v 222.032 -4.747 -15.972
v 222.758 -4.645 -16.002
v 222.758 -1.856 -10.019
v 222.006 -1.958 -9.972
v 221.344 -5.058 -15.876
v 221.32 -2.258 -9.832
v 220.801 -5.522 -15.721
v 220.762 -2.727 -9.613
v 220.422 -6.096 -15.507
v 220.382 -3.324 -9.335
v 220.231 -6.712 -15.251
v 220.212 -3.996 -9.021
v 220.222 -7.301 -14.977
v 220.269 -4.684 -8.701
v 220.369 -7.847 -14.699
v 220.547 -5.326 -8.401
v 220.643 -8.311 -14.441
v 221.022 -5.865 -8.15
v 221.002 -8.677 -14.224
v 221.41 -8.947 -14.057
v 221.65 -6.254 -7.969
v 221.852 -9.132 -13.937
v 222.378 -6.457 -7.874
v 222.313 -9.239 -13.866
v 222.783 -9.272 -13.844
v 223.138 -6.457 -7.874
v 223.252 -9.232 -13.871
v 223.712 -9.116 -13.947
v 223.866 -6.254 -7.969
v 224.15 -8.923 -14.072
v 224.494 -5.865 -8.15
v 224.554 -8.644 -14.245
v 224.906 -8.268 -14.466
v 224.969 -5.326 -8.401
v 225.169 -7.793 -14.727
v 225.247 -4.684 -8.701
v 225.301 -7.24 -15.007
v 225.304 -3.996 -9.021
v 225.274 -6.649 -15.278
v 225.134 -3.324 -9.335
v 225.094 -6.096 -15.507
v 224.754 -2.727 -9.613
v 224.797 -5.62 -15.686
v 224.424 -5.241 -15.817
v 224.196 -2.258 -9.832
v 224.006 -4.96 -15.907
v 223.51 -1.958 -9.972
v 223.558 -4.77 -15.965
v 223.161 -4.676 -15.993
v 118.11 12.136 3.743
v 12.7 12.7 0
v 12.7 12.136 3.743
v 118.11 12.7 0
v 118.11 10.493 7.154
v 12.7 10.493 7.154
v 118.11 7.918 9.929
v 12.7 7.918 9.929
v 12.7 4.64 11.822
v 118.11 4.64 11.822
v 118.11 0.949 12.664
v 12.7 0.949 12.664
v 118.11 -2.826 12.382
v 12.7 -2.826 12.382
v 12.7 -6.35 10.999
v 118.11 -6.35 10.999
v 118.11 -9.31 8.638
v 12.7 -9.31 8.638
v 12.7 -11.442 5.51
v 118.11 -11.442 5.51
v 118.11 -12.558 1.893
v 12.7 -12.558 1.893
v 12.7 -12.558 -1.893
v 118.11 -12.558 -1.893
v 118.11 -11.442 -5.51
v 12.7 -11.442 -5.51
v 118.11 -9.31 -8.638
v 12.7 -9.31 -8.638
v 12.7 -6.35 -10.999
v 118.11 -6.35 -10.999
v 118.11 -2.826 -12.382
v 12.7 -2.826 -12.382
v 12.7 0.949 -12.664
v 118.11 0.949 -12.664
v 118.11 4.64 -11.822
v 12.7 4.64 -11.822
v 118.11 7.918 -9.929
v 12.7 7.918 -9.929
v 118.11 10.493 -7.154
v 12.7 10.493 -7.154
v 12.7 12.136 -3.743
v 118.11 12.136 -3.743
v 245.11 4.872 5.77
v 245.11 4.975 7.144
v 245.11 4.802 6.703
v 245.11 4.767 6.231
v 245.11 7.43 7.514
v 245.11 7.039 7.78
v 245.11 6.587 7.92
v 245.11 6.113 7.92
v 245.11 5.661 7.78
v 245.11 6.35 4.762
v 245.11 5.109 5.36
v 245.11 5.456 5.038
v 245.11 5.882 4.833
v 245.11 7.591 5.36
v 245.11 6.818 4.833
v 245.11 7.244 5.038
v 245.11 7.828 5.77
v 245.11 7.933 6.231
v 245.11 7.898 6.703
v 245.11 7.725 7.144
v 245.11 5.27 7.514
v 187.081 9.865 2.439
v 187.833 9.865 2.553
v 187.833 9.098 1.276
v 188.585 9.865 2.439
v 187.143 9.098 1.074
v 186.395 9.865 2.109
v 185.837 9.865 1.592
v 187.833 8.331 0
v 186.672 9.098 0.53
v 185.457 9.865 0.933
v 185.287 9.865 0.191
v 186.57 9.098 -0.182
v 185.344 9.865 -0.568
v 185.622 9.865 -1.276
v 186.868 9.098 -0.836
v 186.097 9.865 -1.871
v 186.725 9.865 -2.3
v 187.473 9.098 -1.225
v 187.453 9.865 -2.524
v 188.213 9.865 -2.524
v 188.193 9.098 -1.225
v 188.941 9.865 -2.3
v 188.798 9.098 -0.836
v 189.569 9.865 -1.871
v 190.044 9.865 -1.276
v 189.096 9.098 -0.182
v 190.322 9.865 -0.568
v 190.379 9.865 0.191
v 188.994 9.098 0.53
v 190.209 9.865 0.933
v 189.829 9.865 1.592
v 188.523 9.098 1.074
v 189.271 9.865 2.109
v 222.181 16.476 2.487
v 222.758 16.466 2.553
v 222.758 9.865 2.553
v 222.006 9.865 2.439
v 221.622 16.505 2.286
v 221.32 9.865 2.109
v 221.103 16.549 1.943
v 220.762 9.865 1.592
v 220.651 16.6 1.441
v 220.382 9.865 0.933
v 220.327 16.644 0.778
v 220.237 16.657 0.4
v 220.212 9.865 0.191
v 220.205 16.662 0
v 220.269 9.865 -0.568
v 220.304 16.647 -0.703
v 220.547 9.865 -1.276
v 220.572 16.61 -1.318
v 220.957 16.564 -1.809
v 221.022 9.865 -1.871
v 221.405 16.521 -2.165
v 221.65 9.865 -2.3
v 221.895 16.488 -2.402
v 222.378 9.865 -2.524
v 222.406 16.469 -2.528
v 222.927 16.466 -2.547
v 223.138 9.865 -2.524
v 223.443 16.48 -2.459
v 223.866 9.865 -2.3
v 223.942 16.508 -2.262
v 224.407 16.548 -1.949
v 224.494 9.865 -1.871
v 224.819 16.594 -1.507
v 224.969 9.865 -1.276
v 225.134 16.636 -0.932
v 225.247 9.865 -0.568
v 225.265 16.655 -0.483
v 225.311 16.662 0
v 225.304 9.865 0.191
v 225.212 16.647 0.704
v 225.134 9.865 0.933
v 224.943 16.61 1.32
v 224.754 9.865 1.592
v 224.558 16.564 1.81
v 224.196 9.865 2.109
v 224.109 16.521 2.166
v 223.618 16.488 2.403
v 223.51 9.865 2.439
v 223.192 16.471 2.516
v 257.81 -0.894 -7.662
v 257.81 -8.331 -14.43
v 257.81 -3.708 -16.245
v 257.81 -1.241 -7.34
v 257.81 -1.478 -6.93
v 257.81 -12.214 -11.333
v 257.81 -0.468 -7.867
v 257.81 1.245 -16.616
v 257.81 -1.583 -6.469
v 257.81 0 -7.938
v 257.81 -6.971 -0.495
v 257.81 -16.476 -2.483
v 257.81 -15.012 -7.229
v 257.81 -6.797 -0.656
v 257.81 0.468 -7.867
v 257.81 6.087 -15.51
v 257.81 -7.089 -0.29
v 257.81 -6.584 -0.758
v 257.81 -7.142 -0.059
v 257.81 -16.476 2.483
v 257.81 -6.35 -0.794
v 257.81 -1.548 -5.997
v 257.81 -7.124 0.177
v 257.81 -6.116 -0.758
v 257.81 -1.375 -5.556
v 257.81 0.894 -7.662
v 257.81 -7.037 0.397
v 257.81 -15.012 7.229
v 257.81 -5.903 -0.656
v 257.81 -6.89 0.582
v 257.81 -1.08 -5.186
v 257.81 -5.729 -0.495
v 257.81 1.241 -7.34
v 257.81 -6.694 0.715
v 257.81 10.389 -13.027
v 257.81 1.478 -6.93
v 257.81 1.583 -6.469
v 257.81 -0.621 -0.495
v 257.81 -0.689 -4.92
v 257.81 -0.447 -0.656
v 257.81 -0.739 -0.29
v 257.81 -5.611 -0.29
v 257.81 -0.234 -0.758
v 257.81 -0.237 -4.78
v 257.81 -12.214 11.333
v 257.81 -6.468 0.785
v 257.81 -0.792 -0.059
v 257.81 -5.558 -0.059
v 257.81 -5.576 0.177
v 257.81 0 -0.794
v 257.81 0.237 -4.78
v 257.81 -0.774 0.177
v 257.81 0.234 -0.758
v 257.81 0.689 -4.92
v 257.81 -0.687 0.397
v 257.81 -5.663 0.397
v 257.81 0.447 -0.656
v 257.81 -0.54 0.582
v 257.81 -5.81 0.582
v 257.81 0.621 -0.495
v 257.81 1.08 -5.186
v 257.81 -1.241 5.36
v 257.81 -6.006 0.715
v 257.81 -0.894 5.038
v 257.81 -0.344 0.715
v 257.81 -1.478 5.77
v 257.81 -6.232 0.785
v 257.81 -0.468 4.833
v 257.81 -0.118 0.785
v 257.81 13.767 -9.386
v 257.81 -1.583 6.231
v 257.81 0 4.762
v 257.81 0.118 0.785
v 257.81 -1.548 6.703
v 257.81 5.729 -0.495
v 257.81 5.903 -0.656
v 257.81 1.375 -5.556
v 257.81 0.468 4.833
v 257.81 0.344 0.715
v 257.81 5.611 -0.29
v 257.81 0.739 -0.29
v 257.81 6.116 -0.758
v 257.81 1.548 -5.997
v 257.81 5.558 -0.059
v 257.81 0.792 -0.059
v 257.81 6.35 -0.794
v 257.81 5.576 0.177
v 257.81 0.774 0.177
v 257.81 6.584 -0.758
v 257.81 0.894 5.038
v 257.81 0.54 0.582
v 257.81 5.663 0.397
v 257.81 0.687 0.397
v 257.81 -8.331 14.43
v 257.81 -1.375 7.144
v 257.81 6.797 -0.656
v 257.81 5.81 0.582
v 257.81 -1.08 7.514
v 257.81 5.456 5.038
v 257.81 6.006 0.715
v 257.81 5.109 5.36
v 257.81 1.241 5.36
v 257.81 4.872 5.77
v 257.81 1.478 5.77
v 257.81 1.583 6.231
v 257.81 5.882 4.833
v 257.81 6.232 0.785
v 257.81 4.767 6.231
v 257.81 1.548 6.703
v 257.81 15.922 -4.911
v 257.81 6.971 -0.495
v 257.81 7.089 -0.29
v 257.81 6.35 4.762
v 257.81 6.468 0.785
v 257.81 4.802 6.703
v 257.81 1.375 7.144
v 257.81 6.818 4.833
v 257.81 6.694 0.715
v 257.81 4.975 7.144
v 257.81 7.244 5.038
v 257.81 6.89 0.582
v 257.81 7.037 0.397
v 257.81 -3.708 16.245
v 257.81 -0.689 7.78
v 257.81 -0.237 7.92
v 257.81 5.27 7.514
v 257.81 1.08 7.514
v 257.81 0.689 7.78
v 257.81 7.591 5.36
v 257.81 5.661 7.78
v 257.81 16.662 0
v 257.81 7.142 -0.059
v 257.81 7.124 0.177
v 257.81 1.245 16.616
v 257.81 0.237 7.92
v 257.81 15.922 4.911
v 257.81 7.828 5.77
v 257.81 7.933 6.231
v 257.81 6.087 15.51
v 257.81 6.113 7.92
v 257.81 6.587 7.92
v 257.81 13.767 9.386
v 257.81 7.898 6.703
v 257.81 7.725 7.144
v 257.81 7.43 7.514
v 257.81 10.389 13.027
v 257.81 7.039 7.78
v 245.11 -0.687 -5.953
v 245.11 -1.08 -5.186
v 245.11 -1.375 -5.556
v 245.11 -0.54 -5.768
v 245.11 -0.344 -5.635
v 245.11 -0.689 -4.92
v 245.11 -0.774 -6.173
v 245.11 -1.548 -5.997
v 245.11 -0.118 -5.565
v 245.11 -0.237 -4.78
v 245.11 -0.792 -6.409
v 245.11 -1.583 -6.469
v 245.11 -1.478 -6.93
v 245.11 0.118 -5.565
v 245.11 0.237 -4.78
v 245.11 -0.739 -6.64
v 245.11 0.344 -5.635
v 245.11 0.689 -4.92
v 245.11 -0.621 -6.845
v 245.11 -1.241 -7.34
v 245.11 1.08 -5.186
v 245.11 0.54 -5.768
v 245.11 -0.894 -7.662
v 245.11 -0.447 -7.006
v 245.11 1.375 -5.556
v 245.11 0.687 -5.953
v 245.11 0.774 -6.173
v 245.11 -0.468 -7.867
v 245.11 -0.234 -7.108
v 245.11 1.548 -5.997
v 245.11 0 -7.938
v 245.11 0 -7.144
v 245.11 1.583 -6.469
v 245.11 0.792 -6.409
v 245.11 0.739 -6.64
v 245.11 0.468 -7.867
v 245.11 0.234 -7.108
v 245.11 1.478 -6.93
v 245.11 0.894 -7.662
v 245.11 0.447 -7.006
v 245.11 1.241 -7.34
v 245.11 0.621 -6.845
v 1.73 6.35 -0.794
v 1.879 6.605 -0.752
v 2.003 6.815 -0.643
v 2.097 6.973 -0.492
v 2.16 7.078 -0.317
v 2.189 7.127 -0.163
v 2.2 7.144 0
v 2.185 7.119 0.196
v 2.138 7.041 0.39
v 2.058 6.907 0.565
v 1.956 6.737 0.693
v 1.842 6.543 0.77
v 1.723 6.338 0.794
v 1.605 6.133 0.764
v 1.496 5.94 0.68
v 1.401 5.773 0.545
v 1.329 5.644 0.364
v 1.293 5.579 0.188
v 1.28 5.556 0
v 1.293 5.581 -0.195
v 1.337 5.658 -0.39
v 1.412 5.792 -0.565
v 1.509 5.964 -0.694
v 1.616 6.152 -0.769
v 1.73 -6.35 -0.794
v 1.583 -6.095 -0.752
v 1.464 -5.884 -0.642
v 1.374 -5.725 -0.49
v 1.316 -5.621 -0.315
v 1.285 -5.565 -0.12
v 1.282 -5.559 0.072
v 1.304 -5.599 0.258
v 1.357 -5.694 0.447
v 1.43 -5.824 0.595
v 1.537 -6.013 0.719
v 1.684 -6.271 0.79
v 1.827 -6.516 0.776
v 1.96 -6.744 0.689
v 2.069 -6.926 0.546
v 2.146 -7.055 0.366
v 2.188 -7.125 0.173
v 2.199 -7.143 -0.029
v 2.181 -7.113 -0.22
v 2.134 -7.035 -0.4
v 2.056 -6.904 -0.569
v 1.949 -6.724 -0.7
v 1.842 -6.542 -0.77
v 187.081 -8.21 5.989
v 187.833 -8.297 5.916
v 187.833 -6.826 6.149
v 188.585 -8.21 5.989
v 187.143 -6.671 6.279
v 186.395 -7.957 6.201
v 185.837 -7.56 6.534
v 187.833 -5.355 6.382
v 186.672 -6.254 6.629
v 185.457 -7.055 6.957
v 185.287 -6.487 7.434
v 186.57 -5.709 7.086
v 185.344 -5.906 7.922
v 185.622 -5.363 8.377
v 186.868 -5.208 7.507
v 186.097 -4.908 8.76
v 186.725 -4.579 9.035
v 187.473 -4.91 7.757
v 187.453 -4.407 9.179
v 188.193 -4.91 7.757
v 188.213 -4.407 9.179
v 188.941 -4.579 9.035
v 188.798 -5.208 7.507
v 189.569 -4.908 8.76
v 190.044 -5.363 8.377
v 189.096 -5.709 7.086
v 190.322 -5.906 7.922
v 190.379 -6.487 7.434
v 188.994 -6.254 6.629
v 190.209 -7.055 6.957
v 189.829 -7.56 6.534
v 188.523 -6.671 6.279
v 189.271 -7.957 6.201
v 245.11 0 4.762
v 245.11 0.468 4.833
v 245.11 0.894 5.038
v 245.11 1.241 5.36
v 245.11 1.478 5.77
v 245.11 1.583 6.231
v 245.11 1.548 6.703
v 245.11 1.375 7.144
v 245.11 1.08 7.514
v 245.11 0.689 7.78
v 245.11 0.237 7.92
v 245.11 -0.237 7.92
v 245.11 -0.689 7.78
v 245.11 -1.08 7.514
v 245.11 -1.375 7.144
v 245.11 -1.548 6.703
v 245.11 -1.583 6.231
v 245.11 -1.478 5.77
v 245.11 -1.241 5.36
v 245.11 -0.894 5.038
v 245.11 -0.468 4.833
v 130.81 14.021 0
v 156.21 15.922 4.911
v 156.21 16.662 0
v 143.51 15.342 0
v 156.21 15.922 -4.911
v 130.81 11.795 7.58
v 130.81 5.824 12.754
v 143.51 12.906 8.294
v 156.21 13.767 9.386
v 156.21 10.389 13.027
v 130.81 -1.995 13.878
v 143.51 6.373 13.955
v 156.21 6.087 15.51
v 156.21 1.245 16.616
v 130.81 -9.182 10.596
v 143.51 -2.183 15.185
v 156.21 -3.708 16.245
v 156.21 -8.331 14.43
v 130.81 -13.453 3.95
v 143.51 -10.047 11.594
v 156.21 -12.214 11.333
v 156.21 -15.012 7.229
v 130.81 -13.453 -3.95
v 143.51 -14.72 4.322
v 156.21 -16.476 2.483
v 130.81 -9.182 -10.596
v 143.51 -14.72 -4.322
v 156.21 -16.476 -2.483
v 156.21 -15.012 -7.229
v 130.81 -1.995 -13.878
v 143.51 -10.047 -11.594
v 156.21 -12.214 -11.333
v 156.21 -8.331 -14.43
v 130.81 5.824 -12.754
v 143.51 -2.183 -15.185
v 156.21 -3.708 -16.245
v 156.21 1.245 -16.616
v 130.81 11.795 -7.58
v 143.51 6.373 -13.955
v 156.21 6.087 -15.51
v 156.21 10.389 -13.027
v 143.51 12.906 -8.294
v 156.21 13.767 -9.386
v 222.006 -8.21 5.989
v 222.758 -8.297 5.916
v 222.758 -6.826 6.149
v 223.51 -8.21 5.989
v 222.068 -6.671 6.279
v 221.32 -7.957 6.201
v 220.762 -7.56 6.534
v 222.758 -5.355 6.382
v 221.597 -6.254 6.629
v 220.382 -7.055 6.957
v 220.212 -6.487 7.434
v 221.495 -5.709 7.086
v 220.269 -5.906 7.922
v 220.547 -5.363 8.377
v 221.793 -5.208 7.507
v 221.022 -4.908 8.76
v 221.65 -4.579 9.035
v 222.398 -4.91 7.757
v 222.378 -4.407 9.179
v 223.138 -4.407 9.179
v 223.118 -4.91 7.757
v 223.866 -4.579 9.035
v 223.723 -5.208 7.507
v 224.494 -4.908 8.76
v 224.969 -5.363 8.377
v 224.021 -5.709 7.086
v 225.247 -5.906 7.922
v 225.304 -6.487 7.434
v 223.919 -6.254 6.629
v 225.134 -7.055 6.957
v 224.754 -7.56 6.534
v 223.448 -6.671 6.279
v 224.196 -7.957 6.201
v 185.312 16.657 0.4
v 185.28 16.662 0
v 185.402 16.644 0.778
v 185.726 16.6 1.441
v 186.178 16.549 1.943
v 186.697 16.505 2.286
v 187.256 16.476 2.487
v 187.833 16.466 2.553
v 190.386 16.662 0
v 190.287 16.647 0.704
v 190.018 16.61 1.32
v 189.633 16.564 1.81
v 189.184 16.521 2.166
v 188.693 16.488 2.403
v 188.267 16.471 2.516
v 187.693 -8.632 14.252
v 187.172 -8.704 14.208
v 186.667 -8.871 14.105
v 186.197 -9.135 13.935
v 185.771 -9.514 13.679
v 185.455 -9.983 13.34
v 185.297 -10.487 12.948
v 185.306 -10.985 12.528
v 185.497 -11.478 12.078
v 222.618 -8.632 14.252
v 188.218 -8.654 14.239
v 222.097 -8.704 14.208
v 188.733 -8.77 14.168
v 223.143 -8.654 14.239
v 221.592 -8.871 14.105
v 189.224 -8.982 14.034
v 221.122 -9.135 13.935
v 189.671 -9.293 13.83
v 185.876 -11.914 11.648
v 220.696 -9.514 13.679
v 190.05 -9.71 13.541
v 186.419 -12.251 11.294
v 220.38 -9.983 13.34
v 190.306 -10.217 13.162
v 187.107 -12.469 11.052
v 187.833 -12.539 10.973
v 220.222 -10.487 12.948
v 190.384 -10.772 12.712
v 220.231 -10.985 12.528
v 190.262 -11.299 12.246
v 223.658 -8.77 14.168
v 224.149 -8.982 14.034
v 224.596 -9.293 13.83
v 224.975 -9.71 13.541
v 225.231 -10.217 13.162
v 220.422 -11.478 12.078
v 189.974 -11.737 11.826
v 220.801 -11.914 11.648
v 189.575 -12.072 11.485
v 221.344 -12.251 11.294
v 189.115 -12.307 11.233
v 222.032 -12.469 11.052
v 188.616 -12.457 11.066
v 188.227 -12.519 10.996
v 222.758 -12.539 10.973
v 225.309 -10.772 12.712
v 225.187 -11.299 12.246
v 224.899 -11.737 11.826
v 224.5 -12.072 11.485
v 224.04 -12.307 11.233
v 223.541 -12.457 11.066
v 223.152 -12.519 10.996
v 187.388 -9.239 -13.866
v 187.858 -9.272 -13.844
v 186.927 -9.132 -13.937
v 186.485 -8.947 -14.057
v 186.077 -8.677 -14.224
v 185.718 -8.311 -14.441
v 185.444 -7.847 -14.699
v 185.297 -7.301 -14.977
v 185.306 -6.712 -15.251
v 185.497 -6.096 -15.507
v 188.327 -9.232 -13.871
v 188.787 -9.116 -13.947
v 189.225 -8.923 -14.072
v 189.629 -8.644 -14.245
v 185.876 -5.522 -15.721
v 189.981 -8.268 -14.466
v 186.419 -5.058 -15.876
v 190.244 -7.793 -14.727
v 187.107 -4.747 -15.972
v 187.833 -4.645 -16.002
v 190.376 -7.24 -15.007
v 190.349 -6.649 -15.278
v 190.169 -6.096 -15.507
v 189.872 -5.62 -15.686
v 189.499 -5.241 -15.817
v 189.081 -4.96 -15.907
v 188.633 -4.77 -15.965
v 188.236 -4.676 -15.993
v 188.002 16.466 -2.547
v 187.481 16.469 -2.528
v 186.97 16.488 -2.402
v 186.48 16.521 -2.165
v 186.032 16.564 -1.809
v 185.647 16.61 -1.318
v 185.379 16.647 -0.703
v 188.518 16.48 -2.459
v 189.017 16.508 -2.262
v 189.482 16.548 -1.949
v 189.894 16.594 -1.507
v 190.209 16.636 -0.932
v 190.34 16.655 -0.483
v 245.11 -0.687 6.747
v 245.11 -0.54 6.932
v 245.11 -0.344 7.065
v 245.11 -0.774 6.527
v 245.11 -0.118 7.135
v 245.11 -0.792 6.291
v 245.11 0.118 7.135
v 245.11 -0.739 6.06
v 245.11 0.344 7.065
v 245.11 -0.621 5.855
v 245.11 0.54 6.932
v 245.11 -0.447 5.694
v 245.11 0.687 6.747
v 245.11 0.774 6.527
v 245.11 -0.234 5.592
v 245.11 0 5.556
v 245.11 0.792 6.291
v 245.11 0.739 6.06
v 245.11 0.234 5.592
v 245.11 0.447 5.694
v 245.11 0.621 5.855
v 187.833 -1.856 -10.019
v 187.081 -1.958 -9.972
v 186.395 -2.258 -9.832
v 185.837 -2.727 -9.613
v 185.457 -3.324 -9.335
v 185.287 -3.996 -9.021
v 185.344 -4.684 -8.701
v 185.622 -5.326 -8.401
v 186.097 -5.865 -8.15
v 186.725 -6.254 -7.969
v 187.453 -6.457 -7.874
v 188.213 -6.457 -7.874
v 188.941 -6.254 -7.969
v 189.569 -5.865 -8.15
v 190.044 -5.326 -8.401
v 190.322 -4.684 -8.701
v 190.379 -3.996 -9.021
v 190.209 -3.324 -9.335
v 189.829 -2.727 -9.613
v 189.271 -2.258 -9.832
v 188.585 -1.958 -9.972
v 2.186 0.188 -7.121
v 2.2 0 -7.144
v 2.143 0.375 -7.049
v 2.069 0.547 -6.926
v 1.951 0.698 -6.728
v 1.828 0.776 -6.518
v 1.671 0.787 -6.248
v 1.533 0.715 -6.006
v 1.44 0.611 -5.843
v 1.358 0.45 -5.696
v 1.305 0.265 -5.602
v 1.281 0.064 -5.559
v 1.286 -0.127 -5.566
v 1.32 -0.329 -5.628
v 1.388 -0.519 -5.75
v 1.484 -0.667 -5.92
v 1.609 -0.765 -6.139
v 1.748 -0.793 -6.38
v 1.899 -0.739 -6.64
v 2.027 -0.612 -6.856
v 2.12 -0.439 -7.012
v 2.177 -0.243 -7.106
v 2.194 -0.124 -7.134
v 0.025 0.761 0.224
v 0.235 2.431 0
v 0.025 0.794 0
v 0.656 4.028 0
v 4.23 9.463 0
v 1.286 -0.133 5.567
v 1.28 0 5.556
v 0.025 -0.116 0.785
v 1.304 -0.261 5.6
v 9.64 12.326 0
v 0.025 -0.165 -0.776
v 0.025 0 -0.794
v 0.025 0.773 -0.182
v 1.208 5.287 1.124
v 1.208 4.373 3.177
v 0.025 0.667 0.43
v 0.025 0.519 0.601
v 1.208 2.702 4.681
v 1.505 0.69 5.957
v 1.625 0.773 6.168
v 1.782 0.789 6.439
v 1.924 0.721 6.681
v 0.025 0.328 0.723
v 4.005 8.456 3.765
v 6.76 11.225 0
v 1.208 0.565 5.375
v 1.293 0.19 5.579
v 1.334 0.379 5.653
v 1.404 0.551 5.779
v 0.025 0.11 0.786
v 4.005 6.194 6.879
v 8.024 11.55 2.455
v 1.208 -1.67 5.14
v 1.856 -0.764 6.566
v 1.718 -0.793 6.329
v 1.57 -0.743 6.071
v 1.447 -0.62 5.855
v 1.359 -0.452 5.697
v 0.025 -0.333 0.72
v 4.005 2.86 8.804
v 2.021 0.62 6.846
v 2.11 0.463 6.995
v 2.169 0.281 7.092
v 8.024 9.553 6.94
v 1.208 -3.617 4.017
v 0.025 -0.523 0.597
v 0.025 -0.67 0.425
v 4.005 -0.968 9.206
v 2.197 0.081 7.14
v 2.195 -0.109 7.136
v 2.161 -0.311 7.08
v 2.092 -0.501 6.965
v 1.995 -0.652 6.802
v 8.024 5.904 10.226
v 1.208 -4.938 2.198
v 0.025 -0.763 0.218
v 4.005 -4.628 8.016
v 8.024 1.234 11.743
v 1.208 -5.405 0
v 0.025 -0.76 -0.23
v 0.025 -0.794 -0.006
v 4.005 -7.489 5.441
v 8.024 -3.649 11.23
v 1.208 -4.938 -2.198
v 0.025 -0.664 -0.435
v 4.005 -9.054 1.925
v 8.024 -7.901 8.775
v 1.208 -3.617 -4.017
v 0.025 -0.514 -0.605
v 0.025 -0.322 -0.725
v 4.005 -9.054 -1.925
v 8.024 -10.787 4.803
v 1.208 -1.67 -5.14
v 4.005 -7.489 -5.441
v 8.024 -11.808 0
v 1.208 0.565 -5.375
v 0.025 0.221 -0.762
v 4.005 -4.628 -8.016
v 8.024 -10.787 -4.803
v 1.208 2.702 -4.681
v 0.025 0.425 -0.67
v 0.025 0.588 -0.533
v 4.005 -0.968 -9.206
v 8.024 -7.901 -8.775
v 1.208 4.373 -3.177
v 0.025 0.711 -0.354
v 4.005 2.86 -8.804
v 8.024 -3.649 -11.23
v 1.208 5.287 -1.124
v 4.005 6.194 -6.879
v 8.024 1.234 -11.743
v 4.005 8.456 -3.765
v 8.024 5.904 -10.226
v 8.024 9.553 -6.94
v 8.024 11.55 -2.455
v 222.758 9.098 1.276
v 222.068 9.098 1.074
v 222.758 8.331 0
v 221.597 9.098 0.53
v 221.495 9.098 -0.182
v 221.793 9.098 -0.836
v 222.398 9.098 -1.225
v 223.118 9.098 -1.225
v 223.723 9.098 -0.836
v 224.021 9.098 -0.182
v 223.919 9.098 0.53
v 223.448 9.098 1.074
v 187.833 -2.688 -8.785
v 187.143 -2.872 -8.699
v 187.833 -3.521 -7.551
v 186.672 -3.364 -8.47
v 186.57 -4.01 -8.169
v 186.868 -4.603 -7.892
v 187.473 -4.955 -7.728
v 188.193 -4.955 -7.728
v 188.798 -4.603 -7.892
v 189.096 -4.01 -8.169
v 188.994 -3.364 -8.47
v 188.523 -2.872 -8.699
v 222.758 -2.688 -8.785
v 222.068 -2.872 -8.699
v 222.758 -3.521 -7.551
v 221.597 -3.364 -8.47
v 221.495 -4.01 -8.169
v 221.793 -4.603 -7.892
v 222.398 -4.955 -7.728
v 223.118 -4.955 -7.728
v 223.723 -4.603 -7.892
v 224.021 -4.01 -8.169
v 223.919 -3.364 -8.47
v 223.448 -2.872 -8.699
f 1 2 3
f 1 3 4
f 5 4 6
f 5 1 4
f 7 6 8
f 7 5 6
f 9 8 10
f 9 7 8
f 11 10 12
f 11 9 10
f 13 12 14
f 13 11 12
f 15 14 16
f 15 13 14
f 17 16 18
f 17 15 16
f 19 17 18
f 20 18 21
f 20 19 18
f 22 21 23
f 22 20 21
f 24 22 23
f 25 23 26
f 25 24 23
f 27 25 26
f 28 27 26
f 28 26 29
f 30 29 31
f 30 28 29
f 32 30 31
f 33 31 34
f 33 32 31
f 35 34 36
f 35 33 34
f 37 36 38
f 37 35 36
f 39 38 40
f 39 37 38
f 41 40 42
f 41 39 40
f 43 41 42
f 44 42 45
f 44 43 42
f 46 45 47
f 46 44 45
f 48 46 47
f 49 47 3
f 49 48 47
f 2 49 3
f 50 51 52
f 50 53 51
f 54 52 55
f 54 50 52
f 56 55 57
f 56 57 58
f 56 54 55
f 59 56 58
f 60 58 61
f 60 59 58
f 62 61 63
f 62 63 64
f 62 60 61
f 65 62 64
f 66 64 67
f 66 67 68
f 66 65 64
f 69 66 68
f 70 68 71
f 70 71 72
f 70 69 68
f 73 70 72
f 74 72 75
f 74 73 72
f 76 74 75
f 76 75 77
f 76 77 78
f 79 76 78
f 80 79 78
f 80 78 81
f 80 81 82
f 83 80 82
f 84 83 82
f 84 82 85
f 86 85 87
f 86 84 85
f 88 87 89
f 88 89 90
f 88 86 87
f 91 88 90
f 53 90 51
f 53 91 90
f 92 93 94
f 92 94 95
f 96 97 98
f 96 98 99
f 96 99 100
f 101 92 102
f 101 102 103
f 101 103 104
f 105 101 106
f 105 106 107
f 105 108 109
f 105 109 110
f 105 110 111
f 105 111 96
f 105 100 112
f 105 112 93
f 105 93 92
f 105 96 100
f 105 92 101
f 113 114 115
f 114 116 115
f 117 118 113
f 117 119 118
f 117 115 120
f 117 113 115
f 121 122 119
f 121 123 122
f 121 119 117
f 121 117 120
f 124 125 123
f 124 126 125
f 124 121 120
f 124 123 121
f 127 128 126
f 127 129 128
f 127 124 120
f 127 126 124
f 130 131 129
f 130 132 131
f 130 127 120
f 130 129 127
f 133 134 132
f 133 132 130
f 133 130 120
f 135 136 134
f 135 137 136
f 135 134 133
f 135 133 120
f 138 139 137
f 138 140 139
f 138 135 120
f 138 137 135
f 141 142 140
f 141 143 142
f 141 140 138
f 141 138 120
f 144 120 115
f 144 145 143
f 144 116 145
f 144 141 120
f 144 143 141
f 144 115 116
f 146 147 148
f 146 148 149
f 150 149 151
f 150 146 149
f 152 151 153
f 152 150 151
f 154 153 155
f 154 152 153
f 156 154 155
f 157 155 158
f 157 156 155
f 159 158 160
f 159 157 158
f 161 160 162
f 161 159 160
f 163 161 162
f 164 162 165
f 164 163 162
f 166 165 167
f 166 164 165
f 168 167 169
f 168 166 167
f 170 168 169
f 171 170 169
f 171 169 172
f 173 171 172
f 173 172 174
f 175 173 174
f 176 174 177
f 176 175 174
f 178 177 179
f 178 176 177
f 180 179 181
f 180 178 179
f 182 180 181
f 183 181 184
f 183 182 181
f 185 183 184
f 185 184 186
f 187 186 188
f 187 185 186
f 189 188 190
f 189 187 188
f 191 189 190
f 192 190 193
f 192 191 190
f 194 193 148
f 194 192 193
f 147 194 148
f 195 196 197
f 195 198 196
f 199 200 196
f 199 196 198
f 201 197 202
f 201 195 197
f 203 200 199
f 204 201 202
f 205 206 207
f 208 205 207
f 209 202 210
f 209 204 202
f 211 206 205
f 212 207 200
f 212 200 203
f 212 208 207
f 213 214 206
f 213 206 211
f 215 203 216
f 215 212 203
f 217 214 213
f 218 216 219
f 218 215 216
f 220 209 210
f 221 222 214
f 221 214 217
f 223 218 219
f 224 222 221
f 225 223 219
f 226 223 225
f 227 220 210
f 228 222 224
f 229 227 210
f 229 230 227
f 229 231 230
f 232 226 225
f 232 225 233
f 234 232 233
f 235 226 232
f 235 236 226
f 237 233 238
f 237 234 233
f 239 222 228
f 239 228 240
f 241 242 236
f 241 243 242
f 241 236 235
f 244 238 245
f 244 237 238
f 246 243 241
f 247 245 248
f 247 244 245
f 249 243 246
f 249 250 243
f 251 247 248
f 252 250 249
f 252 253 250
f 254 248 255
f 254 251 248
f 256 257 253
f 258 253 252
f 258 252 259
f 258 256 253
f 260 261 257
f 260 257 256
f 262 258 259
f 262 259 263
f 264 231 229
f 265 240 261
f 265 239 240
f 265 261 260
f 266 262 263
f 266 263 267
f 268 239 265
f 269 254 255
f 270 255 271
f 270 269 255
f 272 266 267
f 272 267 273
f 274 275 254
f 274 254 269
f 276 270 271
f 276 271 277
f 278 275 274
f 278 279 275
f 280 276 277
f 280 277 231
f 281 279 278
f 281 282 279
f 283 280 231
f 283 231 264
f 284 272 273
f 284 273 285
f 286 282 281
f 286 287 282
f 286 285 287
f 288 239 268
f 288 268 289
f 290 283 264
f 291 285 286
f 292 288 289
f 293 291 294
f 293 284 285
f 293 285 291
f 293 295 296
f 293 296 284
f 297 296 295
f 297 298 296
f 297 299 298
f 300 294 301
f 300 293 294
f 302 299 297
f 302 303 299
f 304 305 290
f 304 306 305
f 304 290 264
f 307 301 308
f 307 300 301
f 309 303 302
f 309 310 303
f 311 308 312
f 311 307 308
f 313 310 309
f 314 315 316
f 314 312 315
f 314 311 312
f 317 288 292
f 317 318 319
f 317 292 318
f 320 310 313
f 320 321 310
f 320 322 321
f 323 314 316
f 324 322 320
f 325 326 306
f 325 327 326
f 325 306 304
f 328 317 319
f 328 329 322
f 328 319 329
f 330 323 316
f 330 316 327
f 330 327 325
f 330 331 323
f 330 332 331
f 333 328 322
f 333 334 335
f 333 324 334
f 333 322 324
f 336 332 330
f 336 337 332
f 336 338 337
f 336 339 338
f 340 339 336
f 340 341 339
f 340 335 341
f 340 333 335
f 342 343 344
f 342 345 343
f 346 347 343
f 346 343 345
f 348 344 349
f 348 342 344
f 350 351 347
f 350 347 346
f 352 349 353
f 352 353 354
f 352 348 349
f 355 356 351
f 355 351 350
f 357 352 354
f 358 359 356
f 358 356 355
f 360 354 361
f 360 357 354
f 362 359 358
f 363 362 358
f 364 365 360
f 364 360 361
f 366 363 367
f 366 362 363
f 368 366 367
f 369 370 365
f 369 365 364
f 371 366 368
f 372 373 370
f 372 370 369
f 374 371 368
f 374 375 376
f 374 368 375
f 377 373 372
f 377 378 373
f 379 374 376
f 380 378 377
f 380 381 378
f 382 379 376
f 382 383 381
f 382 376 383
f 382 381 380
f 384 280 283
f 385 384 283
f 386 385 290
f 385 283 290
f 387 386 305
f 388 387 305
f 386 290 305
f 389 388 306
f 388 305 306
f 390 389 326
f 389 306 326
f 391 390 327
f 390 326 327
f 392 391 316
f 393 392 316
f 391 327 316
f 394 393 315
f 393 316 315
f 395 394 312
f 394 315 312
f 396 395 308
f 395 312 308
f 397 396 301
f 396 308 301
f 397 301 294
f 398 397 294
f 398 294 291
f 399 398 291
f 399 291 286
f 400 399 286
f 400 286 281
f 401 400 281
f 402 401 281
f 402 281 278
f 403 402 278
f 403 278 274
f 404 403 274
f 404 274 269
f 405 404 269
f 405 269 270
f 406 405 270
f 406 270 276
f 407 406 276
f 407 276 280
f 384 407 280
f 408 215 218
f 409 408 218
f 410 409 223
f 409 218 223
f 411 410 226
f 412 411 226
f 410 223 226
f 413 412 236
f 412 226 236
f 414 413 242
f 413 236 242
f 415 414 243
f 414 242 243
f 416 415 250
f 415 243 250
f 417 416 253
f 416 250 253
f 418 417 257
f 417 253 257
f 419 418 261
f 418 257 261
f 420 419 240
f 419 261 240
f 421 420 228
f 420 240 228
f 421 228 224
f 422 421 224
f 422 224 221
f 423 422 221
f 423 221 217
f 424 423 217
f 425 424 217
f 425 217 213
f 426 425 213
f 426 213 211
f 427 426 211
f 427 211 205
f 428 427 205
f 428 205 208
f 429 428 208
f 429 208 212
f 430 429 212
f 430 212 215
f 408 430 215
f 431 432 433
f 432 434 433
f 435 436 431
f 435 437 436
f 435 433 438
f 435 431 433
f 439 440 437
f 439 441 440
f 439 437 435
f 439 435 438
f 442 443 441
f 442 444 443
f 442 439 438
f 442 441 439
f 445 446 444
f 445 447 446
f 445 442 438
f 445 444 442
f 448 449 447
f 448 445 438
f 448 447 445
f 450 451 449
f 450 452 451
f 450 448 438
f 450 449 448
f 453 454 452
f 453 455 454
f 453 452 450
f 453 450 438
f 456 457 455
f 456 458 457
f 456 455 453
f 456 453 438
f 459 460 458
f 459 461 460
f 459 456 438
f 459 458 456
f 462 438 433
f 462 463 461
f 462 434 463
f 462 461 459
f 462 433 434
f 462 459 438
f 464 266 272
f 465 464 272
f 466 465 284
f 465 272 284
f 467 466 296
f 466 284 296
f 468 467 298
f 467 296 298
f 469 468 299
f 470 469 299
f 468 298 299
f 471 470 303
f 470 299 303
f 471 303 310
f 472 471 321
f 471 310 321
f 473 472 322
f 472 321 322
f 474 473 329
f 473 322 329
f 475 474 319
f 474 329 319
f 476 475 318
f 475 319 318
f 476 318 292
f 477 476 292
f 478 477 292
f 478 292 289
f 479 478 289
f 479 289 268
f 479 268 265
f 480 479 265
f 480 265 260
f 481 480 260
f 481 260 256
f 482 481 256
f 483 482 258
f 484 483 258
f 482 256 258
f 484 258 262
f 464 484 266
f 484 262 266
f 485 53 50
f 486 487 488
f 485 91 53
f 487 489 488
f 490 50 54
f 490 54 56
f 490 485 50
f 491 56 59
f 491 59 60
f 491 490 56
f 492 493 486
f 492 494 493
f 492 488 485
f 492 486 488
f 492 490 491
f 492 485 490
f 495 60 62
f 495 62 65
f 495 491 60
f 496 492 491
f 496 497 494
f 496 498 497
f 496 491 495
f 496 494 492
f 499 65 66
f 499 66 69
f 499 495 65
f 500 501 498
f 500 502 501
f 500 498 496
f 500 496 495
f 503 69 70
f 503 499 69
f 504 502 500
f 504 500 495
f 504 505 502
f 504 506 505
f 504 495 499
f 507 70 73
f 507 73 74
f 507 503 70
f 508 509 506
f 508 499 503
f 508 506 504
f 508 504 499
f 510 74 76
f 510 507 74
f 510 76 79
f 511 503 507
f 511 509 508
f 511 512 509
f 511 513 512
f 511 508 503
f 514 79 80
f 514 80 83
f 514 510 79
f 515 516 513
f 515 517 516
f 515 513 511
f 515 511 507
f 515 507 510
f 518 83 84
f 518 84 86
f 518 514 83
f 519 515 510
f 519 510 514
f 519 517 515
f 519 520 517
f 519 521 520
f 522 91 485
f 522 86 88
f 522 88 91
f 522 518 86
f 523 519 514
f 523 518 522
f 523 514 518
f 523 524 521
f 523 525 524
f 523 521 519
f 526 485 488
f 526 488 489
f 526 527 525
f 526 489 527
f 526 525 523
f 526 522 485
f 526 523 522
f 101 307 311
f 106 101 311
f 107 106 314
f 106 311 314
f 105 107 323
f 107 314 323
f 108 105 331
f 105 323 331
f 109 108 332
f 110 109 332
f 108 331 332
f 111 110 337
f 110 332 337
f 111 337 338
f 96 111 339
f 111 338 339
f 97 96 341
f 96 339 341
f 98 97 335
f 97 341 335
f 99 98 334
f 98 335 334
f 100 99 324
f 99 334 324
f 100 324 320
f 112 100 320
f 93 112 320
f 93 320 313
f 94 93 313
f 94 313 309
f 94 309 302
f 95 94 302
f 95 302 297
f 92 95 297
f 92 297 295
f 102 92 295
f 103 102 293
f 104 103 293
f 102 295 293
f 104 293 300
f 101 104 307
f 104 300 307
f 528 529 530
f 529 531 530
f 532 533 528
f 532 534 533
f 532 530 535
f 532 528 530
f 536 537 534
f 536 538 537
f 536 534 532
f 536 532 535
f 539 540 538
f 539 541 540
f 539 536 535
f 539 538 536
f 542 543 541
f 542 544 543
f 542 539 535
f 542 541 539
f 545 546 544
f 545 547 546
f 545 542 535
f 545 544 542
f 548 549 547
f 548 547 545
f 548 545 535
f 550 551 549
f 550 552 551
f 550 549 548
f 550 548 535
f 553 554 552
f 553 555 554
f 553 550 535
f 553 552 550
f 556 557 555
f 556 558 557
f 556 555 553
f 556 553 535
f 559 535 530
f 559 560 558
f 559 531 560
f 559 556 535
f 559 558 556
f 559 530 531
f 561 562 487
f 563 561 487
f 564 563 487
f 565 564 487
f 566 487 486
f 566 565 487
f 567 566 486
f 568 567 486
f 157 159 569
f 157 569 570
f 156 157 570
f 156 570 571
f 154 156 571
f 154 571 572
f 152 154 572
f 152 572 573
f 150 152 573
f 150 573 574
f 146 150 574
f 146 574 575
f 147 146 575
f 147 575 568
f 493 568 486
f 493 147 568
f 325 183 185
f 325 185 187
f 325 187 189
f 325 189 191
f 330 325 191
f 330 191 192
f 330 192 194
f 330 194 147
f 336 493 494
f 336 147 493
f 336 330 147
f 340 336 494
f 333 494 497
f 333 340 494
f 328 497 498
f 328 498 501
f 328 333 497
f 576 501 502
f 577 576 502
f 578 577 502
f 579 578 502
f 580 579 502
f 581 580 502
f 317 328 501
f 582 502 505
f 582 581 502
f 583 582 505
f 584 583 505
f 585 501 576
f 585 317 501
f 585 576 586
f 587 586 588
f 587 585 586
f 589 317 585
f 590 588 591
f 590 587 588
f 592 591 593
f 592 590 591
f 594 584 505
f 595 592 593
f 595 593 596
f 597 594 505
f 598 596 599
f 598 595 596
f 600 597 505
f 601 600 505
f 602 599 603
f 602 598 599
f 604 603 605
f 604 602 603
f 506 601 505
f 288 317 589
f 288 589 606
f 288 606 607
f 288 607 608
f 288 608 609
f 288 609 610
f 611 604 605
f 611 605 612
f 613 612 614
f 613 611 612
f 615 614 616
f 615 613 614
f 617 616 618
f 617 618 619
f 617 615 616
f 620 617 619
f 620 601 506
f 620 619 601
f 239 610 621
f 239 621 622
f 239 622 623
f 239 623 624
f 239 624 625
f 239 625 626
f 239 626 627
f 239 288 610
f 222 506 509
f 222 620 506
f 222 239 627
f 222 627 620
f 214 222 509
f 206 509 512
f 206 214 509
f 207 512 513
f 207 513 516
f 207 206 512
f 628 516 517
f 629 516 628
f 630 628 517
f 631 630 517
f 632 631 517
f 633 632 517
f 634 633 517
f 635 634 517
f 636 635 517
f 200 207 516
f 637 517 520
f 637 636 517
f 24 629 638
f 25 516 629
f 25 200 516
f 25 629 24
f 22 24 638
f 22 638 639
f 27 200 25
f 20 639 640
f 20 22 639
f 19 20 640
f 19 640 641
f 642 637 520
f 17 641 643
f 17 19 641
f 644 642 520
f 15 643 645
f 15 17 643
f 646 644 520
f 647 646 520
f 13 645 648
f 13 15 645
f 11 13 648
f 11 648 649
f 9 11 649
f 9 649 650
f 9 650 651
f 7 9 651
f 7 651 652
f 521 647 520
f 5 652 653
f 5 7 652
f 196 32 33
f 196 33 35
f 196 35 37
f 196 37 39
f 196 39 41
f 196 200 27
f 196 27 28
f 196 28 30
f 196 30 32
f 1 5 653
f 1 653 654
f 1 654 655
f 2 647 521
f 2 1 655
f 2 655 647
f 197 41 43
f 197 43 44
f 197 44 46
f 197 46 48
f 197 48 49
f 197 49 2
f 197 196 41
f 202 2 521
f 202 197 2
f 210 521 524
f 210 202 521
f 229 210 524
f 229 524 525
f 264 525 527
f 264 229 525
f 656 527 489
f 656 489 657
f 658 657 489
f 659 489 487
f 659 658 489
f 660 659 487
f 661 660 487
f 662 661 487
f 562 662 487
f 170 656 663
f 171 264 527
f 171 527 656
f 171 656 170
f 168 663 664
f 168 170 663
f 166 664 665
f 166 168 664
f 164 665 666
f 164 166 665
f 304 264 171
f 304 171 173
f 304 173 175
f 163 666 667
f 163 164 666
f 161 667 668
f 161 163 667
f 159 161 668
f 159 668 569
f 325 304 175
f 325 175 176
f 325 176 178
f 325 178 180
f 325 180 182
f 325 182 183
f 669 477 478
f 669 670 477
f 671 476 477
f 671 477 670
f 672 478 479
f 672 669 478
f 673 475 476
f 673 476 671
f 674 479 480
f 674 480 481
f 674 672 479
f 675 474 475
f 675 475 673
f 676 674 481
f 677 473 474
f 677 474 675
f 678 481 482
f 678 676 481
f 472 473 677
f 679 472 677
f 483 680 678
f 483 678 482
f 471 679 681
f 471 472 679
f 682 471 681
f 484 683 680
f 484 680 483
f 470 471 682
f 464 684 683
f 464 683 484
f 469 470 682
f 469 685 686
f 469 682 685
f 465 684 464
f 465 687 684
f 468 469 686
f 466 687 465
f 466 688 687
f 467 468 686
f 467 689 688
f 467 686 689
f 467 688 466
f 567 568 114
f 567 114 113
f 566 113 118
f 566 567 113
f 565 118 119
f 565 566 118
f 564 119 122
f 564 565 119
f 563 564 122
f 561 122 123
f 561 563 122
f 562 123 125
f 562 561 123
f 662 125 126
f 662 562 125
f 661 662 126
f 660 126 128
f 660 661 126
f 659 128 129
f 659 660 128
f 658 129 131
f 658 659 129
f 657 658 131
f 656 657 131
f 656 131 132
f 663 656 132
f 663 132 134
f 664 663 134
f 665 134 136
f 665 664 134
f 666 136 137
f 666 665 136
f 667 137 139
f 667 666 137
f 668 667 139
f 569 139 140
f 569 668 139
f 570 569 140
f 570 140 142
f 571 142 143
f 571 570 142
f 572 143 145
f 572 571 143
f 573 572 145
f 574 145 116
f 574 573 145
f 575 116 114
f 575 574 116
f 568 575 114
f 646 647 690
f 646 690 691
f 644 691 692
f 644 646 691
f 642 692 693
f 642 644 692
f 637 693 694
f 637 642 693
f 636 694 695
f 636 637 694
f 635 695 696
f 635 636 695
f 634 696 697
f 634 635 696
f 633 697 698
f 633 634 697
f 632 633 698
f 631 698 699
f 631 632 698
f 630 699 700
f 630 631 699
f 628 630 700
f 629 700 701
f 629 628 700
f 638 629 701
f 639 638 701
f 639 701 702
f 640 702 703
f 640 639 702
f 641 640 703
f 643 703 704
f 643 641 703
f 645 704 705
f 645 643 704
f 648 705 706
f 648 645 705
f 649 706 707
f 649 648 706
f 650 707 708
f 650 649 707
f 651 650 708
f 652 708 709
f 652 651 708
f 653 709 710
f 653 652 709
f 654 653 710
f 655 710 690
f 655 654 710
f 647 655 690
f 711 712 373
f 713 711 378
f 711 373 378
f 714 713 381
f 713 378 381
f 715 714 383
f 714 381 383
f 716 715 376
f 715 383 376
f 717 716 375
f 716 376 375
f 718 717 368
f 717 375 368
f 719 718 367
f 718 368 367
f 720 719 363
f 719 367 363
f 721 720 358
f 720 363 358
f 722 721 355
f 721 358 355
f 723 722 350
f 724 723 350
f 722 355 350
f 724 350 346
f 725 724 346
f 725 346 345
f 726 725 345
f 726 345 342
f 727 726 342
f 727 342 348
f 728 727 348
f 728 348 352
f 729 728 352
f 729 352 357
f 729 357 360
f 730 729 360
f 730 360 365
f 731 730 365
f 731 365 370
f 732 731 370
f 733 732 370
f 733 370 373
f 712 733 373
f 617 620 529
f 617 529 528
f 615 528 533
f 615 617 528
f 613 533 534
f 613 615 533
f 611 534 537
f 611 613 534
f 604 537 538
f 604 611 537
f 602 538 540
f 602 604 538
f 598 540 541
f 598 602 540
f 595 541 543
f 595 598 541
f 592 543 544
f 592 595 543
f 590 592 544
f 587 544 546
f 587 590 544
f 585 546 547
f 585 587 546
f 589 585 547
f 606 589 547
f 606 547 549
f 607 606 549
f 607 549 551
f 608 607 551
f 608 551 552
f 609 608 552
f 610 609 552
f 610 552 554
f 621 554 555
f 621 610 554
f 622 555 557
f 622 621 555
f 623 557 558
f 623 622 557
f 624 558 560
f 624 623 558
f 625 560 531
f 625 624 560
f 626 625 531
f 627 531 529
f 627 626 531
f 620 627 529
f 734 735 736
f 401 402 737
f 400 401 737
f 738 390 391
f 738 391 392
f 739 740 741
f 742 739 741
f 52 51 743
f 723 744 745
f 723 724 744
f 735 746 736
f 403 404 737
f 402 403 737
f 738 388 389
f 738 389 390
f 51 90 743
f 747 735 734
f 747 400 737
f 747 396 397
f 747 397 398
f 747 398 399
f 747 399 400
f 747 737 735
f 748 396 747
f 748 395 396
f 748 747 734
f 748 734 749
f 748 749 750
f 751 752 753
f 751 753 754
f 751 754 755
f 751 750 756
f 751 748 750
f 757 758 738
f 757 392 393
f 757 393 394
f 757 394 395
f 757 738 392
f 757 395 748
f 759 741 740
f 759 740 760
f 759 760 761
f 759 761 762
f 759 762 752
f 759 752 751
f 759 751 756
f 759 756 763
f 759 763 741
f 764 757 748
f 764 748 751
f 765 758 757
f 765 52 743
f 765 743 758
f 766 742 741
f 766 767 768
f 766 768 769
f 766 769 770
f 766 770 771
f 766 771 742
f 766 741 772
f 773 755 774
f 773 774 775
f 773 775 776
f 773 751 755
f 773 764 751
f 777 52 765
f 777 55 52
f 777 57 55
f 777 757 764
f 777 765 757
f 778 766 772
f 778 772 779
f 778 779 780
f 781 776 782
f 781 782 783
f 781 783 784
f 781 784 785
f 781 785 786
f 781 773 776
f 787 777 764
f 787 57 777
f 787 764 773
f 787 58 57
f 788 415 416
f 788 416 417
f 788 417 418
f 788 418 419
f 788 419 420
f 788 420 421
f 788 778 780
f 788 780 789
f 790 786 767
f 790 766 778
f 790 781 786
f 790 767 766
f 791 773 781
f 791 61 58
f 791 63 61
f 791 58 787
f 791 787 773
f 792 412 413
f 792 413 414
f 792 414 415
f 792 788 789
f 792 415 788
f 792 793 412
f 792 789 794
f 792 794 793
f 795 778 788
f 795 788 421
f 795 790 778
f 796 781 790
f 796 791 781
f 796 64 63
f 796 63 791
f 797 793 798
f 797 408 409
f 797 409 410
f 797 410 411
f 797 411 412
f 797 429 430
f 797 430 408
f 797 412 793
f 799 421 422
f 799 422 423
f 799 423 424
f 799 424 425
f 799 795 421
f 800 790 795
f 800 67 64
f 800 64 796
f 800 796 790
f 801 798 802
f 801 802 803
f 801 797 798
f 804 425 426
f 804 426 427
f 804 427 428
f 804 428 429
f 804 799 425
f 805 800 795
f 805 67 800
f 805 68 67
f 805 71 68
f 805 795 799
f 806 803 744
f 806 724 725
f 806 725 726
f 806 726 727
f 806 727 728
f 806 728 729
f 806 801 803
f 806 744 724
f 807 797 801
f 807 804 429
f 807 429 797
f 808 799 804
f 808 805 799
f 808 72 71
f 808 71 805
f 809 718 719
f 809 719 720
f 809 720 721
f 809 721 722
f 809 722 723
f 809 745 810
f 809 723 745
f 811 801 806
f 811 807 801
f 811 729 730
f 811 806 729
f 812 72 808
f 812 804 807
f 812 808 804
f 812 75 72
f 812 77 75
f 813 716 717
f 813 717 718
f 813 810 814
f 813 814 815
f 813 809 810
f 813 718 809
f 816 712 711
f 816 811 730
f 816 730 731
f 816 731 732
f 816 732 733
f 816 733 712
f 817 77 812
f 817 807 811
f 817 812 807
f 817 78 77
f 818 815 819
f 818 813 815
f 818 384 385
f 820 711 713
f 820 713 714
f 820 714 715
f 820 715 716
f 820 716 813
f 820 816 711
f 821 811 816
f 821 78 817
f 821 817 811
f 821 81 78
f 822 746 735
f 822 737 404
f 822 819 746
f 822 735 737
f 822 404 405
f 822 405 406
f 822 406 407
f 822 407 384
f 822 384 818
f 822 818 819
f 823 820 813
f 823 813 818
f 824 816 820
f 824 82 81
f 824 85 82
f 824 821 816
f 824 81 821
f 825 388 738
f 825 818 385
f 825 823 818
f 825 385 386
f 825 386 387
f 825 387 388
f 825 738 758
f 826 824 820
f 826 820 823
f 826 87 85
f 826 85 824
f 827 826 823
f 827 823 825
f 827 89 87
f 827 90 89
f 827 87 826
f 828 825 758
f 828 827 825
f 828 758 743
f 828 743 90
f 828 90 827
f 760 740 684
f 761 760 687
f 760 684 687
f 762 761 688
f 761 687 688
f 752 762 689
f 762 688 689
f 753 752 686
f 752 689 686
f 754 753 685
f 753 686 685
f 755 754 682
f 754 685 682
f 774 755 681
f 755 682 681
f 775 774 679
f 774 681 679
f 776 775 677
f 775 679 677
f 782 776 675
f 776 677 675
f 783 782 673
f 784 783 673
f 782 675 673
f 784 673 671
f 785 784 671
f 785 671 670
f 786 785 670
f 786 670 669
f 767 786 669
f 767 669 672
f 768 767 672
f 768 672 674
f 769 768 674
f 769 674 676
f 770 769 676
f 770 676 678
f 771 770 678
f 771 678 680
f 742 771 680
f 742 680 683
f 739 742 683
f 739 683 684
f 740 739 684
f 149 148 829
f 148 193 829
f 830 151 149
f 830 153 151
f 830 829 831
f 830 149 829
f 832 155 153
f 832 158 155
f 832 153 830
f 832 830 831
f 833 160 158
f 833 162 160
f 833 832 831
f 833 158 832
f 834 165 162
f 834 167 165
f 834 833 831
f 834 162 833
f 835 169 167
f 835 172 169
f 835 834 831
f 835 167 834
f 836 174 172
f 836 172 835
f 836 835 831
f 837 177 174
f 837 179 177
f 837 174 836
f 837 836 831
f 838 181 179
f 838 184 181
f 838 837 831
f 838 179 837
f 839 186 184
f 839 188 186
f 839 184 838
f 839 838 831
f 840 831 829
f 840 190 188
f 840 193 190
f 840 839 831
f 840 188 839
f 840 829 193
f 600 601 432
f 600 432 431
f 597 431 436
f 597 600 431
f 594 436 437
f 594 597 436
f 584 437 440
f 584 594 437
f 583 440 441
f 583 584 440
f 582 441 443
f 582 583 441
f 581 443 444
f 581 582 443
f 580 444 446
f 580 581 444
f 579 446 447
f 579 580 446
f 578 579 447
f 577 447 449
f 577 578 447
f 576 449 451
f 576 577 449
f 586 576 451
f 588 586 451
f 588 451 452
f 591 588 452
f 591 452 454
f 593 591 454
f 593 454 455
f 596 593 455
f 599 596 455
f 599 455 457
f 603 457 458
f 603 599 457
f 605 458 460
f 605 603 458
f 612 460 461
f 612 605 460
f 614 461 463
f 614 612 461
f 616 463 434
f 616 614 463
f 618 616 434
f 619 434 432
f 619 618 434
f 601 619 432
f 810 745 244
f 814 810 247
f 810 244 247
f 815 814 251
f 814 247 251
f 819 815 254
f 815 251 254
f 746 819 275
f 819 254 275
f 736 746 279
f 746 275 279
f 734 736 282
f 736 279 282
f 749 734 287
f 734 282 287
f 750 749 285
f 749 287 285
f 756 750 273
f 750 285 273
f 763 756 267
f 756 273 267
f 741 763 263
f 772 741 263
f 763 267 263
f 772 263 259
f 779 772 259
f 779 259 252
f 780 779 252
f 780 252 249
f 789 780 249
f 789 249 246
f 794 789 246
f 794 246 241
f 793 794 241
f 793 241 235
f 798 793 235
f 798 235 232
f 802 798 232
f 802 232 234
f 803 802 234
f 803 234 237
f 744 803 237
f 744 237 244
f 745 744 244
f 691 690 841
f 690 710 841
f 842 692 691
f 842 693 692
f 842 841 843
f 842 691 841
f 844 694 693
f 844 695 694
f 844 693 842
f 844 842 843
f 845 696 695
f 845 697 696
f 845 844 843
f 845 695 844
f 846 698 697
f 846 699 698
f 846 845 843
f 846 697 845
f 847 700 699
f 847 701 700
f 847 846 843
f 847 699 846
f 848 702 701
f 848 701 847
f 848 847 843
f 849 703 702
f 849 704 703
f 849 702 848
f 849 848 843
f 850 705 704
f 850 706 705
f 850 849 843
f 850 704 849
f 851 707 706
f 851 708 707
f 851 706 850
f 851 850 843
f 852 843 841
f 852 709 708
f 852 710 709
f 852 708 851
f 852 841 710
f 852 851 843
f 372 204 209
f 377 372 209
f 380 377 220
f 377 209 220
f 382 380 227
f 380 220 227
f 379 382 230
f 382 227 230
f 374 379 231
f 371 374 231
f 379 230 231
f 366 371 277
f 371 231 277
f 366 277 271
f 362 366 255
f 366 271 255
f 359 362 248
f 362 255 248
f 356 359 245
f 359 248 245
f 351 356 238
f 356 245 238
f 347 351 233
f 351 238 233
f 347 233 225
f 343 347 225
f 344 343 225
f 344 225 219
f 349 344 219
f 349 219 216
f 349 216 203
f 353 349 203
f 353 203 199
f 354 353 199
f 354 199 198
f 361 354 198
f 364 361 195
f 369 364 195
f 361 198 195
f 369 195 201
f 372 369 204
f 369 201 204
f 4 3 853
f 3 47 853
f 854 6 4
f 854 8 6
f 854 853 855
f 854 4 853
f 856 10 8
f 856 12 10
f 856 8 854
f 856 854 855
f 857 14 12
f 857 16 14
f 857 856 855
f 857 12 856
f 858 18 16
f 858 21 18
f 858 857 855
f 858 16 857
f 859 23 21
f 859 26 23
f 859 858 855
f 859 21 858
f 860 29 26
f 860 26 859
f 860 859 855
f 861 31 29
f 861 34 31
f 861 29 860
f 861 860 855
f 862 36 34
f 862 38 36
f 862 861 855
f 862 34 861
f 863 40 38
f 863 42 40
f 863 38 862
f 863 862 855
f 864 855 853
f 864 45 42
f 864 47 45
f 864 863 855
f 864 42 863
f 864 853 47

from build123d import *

# Parameters (mm, degrees)
SKETCH3_R                             = 0.79375
CUT_EXTRUDE1_DEPTH                    = 258.810003035
SKETCH4_R                             = 1.5875
CUT_EXTRUDE2_DEPTH                    = 12.7
TAP_DRILL_FOR_10_HELICOIL2_AT_2_COUNT = 2
TAP_DRILL_FOR_10_HELICOIL2_AT_2_PITCH = 34.925
CIRPATTERN2_COUNT                     = 3
CIRPATTERN2_ANGLE                     = 230
SKETCH11_R                            = 1.5875
CUT_EXTRUDE3_DEPTH                    = 12.7


with BuildPart() as part:
    # Sketch1 → Revolve1 (revolve)
    with BuildSketch(Plane.XY):
        with BuildLine():
            Line((12.7, 12.7), (118.11, 12.7))
            Line((118.11, 12.7), (156.210003035, 16.662289952))
            Line((156.210003035, 16.662289952), (257.810003035, 16.662289952))
            Line((257.810003035, 16.662289952), (257.810003035, 0))
            Line((257.810003035, 0), (0, 0))
            ThreePointArc((0, 0), (3.719743879, 8.980256121), (12.7, 12.7))
        make_face()
    revolve(axis=Axis((0, 0, 0), (1, 0, 0)))

    # Sketch3 → Cut-Extrude1 (cut, through all)
    with BuildSketch(Plane(origin=(257.810003035, 0, 0), x_dir=(0, 0, -1), z_dir=(1, 0, 0))):
        Circle(SKETCH3_R)
        with Locations((6.35, 0)):
            Circle(SKETCH3_R)
        with Locations((-6.35, 0)):
            Circle(SKETCH3_R)
        with Locations((0, 6.35)):
            Circle(SKETCH3_R)
        with Locations((0, -6.35)):
            Circle(SKETCH3_R)
    extrude(amount=-CUT_EXTRUDE1_DEPTH, mode=Mode.SUBTRACT)

    # Sketch4 → Cut-Extrude2 (cut)
    with BuildSketch(Plane(origin=(257.810003035, 0, 0), x_dir=(0, 0, -1), z_dir=(1, 0, 0))):
        with Locations((-6.35, 0)):
            Circle(SKETCH4_R)
        with Locations((6.35, 0)):
            Circle(SKETCH4_R)
    extrude(amount=-CUT_EXTRUDE2_DEPTH, mode=Mode.SUBTRACT)

    # Sketch8 → Tap Drill for #10 Helicoil2 (revolve, cut)
    with BuildSketch(Plane(origin=(222.758003035, 16.662289952, 0), x_dir=(0, 0, 1), z_dir=(1, 0, 0))):
        Polygon((0, 0), (0, 8.3312), (2.5527, 6.797383098), (2.5527, 0), align=None)
    tap_drill_for_10_helicoil2 = revolve(axis=Axis((222.758003035, 23.012289952, 0), (0, -1, 0)), mode=Mode.SUBTRACT)

    # Tap Drill for #10 Helicoil2 at 2: Tap Drill for #10 Helicoil2 ×2
    with Locations(*[(-i * TAP_DRILL_FOR_10_HELICOIL2_AT_2_PITCH, 0, 0) for i in range(1, TAP_DRILL_FOR_10_HELICOIL2_AT_2_COUNT)]):
        add(tap_drill_for_10_helicoil2, mode=Mode.SUBTRACT)

    # CirPattern2: Tap Drill for #10 Helicoil2 ×3 about axis
    cirpattern2_axis = Axis((257.810003035, 0, 0), (-1, 0, 0))
    for i in range(1, CIRPATTERN2_COUNT):
        add(tap_drill_for_10_helicoil2.rotate(cirpattern2_axis, i * CIRPATTERN2_ANGLE / (CIRPATTERN2_COUNT - 1)), mode=Mode.SUBTRACT)

    # CirPattern2 copy 1 sketch → CirPattern2 copy 1 (revolve, cut)
    with BuildSketch(Plane(origin=(187.833003035, -7.041788016, -15.101163133), x_dir=(0, 0.906307787, -0.422618262), z_dir=(1, 0, 0))):
        Polygon((0, 0), (0, 8.3312), (2.5527, 6.797383098), (2.5527, 0), align=None)
    revolve(axis=Axis((187.833003035, -9.725413978, -20.856217581), (0, 0.422618262, 0.906307787)), mode=Mode.SUBTRACT)

    # CirPattern2 copy 2 sketch → CirPattern2 copy 2 (revolve, cut)
    with BuildSketch(Plane(origin=(187.833003035, -10.71031353, 12.764054627), x_dir=(0, -0.766044443, -0.64278761), z_dir=(1, 0, 0))):
        Polygon((0, 0), (0, 8.3312), (2.5527, 6.797383098), (2.5527, 0), align=None)
    revolve(axis=Axis((187.833003035, -14.792014851, 17.628436841), (0, 0.64278761, -0.766044443)), mode=Mode.SUBTRACT)

    # Sketch11 → Cut-Extrude3 (cut)
    with BuildSketch(Plane(origin=(257.810003035, 0, 0), x_dir=(0, 0, -1), z_dir=(1, 0, 0))):
        with Locations((-6.35, 6.35)):
            Circle(SKETCH11_R)
    extrude(amount=-CUT_EXTRUDE3_DEPTH, mode=Mode.SUBTRACT)


solid = part.part
